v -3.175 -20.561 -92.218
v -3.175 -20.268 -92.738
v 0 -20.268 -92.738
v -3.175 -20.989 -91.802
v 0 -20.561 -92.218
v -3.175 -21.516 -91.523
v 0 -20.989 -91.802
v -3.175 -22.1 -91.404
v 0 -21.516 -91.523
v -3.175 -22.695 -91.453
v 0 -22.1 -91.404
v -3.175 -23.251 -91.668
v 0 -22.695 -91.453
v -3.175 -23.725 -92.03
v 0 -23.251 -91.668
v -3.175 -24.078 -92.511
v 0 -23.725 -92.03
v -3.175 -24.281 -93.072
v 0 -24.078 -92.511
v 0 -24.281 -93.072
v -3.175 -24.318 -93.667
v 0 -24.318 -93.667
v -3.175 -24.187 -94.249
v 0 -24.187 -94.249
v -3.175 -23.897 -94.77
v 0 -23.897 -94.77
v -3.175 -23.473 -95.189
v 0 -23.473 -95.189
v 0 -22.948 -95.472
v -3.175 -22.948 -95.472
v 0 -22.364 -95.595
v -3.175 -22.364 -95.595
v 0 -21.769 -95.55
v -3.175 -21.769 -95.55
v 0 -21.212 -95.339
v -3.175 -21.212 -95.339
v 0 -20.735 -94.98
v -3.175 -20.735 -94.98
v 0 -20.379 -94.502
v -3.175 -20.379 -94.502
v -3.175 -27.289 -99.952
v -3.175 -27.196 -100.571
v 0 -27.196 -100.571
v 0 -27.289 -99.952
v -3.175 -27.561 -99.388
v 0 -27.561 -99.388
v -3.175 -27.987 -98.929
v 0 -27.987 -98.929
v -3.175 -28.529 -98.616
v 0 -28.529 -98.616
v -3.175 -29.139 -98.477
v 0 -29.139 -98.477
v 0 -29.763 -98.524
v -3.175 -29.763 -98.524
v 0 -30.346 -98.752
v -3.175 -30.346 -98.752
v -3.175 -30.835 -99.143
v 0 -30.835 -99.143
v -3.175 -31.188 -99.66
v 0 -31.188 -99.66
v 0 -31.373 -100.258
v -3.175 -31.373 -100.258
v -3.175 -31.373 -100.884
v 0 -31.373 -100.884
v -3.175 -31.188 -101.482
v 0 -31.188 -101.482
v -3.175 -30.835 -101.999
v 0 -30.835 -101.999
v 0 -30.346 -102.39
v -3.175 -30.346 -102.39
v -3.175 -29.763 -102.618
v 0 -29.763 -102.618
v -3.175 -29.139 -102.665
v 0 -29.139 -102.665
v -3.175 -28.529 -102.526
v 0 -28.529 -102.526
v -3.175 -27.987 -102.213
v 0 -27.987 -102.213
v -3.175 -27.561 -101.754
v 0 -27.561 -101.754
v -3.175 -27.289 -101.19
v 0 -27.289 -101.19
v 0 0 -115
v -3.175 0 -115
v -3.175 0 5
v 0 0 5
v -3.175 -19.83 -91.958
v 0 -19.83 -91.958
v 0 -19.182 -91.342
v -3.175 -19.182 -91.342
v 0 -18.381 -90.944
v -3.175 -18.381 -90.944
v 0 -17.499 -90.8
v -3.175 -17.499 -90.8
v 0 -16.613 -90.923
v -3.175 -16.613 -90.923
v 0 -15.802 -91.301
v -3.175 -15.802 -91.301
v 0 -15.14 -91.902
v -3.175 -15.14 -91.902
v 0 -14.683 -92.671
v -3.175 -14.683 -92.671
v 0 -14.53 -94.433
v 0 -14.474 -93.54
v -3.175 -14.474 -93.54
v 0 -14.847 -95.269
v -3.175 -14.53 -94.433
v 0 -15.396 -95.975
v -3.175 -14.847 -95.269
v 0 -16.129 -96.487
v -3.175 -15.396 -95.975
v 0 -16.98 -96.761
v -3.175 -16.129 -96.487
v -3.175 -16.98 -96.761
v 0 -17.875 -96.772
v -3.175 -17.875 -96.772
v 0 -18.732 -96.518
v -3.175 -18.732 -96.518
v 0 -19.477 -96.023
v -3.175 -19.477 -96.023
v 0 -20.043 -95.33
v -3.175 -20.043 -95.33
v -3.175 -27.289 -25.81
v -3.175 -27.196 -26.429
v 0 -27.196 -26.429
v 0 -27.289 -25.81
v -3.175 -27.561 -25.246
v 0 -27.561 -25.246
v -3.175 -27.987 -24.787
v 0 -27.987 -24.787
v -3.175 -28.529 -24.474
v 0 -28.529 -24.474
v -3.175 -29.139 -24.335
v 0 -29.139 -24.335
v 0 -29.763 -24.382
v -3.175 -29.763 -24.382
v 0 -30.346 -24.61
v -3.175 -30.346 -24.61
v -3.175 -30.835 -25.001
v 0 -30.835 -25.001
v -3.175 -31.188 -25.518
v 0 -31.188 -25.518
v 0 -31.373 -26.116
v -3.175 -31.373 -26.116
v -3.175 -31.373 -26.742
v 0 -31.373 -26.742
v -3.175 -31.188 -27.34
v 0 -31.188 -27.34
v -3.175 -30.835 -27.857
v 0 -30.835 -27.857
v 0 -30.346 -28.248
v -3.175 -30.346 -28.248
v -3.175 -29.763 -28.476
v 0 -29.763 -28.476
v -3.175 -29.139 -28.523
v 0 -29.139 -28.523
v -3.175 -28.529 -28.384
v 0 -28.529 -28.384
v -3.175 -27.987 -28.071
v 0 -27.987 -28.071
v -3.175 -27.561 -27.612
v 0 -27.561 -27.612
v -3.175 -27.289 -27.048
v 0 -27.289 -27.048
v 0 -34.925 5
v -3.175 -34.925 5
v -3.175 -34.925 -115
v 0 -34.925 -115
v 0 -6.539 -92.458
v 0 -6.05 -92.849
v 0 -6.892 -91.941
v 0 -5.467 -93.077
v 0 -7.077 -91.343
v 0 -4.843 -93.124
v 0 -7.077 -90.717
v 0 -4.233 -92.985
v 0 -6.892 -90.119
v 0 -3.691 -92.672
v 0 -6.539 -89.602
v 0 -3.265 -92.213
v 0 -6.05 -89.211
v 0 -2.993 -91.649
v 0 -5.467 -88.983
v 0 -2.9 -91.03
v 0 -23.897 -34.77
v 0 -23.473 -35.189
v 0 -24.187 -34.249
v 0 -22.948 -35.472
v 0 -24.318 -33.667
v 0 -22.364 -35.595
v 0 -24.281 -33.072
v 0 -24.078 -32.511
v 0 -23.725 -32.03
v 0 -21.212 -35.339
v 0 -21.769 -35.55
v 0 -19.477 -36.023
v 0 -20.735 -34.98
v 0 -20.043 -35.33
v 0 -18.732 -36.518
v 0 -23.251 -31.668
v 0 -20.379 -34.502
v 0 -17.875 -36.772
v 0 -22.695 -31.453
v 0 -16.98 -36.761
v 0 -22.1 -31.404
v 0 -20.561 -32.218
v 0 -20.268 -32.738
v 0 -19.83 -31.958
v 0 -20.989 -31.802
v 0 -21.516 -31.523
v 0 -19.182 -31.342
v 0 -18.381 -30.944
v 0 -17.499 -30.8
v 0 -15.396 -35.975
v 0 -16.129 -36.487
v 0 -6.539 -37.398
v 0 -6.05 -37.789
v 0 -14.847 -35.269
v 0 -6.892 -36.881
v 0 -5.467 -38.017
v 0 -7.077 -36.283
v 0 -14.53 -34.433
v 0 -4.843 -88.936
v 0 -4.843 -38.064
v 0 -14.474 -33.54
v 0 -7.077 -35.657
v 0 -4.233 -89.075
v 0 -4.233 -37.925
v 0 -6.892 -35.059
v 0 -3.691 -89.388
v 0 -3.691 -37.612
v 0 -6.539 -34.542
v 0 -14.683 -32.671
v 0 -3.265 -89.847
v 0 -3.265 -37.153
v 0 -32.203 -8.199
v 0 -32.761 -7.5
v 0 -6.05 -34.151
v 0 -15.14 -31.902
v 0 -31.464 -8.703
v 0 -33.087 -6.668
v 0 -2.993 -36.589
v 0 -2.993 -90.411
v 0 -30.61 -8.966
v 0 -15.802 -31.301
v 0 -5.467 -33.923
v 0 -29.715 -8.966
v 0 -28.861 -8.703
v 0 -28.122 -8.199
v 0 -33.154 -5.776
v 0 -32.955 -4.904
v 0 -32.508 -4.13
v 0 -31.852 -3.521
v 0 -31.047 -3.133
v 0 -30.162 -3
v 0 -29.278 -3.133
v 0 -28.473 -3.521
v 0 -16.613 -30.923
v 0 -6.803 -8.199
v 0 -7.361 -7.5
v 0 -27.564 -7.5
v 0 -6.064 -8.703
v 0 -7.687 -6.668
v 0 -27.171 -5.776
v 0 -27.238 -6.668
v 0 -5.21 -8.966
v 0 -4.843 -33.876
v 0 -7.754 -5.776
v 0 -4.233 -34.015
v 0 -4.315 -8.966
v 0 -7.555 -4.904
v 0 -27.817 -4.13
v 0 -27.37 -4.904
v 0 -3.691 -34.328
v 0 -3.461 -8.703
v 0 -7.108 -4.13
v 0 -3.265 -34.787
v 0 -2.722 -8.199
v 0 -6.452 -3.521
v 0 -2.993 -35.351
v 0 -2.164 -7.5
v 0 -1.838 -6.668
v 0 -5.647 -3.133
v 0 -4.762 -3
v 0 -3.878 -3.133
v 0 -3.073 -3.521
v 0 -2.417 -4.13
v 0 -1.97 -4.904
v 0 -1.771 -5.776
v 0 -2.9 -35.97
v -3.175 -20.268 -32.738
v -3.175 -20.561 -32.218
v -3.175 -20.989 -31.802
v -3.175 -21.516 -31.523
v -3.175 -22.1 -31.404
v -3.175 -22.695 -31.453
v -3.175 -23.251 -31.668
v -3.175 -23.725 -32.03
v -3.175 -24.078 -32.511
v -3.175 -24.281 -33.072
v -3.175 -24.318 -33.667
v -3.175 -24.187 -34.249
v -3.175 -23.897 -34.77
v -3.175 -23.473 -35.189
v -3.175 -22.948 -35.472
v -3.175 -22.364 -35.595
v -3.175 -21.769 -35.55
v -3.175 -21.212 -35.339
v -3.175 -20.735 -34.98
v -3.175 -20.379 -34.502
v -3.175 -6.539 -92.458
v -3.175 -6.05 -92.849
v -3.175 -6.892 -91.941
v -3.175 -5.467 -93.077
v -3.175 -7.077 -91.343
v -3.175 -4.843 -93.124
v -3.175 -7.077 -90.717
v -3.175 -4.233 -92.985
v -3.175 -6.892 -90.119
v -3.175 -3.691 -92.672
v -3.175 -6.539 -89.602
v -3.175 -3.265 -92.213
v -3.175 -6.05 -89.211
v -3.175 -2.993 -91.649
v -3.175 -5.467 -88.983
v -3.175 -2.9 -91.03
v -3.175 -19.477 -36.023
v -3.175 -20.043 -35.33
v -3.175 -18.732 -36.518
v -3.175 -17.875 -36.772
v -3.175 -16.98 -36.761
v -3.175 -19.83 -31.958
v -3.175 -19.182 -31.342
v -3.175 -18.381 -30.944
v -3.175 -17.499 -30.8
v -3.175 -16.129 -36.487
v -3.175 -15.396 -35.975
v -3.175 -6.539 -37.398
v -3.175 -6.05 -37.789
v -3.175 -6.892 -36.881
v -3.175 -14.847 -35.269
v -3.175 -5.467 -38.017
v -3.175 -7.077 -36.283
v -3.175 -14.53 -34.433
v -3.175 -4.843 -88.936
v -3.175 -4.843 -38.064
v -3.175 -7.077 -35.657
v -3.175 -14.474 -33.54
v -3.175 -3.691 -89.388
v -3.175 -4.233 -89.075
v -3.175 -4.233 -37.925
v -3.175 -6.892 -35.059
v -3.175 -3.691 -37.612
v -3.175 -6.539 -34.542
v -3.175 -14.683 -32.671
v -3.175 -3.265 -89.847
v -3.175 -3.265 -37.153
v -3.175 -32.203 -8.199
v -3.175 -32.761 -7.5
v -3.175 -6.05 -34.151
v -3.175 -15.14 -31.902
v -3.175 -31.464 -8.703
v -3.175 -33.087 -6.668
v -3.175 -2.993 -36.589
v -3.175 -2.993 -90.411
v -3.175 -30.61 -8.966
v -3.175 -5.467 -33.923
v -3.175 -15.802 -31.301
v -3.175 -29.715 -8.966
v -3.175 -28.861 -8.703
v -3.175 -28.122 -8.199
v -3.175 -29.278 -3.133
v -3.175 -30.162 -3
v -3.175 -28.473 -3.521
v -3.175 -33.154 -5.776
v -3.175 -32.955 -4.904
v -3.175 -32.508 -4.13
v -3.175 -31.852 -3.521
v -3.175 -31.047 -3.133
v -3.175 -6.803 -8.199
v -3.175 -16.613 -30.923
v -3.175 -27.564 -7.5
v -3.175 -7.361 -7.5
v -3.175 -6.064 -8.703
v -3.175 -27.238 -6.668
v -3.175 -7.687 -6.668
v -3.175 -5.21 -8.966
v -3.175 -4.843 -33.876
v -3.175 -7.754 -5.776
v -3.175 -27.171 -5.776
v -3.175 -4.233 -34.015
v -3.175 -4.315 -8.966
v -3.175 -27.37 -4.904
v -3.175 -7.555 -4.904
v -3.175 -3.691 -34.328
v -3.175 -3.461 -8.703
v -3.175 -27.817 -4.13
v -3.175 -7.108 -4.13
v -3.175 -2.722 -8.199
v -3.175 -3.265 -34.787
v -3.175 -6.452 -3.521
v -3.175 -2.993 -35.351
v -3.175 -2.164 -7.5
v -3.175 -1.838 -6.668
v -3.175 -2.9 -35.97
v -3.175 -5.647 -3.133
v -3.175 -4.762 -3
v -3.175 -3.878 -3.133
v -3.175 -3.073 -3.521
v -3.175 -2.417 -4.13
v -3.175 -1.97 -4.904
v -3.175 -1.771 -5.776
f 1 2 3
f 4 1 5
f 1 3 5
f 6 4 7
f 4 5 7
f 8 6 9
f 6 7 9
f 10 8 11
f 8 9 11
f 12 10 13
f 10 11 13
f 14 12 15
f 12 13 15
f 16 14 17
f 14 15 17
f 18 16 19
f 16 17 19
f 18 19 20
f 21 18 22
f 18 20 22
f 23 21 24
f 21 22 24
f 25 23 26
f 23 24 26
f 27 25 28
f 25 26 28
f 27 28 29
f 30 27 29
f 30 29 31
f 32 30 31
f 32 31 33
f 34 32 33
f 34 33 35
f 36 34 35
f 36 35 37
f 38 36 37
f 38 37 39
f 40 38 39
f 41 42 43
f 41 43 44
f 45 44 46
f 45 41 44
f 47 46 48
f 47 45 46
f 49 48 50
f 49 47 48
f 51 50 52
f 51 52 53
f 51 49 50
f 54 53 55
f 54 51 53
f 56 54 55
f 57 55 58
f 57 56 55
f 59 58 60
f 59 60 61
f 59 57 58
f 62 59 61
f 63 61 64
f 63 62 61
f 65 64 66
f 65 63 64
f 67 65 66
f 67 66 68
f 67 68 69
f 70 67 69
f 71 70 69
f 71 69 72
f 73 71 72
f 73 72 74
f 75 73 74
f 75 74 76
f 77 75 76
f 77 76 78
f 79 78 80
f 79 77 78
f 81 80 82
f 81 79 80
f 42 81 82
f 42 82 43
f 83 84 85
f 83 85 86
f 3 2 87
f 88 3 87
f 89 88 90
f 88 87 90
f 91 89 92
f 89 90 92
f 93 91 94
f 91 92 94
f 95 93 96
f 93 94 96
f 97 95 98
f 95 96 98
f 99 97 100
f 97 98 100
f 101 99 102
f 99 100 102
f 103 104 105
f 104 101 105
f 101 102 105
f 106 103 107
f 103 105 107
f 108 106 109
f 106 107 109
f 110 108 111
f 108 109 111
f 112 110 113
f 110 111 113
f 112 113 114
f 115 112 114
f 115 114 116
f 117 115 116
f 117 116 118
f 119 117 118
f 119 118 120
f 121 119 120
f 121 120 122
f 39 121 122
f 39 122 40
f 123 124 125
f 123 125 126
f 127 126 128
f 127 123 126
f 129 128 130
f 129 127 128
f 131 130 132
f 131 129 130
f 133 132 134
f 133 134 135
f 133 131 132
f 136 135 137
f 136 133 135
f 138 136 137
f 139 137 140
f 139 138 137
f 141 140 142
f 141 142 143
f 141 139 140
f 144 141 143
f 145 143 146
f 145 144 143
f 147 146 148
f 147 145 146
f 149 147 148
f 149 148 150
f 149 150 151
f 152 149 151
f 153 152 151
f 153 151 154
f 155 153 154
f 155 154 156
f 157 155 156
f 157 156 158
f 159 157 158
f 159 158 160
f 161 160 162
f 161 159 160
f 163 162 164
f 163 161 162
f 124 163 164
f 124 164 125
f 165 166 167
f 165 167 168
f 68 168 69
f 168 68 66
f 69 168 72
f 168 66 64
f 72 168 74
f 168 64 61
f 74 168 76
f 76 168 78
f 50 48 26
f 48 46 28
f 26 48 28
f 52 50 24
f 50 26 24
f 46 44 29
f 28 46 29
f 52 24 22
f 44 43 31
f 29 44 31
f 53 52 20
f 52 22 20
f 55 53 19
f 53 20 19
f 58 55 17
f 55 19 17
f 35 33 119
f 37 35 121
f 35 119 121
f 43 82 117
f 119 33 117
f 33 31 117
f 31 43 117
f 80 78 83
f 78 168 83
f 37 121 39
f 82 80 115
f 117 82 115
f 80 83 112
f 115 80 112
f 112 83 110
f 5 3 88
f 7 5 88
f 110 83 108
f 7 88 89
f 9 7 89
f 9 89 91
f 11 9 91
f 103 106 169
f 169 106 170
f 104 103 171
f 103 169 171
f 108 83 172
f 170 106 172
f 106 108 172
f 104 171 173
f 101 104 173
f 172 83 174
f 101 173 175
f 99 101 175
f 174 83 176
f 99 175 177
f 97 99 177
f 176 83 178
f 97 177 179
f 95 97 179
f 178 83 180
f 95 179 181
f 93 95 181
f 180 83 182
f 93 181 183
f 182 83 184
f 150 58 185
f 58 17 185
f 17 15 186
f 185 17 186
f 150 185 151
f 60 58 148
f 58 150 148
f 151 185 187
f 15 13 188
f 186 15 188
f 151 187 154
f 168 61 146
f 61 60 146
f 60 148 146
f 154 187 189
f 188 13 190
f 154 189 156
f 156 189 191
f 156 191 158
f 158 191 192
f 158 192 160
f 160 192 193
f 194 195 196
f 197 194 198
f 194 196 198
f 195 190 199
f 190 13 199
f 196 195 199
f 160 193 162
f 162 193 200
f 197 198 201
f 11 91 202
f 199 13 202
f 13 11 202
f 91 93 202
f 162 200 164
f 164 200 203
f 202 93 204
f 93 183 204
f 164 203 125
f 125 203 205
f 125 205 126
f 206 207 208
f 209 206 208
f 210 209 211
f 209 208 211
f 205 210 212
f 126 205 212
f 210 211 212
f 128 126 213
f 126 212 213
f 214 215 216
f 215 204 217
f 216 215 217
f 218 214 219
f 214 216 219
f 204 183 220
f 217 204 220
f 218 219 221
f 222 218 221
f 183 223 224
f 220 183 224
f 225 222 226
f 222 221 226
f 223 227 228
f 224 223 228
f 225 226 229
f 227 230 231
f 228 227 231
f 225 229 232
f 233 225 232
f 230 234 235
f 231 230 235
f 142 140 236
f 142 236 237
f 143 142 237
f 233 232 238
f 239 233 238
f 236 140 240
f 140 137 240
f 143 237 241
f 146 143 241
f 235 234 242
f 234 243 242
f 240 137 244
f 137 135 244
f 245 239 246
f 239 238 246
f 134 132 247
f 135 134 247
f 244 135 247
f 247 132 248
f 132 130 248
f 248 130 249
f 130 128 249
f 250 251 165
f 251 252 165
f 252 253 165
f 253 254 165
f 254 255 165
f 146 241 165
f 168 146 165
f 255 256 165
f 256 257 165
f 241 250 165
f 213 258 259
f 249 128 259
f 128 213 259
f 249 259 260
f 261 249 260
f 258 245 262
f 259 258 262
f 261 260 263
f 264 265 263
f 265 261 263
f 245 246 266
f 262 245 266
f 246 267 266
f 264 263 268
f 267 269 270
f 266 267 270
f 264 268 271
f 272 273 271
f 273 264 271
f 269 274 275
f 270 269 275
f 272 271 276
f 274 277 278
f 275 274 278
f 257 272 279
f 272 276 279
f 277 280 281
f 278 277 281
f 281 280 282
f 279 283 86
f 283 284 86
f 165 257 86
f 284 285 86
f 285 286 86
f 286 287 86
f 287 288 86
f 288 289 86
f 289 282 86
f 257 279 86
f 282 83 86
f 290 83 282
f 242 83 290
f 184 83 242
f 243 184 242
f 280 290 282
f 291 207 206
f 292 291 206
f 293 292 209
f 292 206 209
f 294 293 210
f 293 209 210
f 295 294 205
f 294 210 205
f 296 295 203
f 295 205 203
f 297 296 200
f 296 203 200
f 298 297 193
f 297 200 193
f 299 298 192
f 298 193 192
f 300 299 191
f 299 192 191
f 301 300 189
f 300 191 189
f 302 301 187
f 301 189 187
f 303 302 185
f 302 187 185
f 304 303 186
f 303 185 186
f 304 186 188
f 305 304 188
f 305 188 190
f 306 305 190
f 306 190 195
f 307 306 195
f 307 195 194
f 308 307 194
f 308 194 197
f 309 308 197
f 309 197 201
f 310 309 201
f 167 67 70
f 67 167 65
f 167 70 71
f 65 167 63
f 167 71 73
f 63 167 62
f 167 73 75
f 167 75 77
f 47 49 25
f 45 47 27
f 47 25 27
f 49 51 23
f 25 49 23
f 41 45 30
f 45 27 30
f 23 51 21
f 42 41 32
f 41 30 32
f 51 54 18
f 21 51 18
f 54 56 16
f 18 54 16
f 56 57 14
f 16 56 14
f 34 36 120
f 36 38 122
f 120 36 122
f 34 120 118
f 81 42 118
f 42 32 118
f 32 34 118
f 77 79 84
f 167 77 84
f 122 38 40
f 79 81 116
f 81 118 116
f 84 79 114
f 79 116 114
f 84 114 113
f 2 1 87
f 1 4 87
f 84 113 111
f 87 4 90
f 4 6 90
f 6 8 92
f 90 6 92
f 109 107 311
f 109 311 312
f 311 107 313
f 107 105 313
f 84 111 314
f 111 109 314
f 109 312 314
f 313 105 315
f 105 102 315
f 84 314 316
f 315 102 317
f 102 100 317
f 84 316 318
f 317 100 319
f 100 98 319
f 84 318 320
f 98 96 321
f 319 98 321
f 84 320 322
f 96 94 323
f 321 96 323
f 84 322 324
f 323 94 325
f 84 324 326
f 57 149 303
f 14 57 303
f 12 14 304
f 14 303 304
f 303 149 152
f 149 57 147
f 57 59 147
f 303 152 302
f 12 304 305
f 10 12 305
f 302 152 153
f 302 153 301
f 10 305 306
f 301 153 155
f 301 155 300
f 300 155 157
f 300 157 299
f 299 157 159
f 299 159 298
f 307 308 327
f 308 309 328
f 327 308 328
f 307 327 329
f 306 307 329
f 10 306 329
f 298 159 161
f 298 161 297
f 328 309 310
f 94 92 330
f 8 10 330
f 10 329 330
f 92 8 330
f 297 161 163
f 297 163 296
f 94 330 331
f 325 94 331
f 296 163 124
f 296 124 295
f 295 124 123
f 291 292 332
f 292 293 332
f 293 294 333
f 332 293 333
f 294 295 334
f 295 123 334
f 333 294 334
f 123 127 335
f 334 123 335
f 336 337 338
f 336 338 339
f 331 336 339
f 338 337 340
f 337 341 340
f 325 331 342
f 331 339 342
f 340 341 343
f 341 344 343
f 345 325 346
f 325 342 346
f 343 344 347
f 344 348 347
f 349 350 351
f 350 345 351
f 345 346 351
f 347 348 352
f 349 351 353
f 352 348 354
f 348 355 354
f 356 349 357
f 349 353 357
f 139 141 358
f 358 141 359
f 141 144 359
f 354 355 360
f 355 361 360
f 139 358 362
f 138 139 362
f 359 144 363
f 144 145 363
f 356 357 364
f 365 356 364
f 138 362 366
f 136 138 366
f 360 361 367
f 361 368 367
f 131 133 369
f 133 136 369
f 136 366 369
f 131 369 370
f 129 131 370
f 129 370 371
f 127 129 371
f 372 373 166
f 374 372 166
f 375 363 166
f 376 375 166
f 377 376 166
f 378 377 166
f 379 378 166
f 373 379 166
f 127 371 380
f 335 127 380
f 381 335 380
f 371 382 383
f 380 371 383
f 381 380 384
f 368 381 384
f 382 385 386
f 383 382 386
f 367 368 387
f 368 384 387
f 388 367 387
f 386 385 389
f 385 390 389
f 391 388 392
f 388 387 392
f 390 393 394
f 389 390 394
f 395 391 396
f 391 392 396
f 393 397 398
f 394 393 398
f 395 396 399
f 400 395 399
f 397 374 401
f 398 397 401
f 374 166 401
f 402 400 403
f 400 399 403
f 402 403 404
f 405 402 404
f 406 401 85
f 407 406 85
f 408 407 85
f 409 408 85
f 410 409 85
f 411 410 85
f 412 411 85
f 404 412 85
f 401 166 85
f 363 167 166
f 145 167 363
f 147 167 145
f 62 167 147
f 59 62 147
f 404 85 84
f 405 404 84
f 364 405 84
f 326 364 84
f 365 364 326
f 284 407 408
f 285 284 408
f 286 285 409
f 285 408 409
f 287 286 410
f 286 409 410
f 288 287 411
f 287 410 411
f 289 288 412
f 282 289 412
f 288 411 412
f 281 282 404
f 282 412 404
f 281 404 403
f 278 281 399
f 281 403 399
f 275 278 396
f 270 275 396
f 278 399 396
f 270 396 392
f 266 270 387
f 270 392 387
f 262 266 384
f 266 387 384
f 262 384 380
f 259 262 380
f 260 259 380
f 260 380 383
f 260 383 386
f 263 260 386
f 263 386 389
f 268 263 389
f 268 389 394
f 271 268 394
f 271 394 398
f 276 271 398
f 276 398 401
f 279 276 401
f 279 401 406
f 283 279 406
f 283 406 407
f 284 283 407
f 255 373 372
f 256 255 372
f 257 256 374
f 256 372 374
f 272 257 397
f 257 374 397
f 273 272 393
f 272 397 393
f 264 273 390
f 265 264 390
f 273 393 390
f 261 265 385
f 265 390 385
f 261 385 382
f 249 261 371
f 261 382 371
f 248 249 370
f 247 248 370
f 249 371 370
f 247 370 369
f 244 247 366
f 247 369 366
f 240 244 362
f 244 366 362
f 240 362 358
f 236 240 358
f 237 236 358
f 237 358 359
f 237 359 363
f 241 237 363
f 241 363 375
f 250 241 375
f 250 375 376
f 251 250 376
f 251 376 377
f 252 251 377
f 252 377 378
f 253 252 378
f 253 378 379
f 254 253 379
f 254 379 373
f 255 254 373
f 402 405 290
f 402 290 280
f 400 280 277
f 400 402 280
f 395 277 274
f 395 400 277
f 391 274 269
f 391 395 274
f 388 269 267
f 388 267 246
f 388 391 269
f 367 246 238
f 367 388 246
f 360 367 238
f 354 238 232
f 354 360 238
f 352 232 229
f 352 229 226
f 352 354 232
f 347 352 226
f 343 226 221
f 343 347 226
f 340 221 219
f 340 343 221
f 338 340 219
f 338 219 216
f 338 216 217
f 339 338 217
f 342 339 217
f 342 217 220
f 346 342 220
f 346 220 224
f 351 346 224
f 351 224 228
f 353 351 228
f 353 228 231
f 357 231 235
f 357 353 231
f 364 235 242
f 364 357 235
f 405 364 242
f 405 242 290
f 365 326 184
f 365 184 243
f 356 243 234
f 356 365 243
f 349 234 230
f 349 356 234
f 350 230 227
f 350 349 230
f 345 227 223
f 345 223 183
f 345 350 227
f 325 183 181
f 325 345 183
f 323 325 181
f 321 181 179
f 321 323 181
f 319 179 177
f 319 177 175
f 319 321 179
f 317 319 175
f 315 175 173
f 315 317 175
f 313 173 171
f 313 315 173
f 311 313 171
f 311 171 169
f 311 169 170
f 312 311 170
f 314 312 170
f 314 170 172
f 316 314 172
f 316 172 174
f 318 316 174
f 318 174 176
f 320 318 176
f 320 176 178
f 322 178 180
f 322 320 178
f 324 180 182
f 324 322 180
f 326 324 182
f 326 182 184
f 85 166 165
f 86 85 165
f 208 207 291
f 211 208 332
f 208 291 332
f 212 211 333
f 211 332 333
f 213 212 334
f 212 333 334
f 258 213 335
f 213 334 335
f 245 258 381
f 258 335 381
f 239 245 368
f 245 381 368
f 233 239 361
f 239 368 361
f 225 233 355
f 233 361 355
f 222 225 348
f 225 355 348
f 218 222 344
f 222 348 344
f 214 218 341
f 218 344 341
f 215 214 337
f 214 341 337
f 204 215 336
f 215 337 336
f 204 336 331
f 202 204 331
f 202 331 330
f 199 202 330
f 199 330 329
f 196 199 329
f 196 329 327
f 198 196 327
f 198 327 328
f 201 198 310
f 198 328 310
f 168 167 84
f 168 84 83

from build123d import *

# Parameters (mm, degrees)
SKETCH1_W                      = 38.1
SKETCH1_H                      = 120
BOSS_EXTRUDE1_DEPTH            = 38.1
SKETCH2_W                      = 34.925
SKETCH2_H                      = 34.925
CUT_EXTRUDE1_DEPTH             = 130.767142413
F_4_2_4_2_DIAMETER_HOLE1_D     = 4.2
F_6_0_6_DIAMETER_HOLE1_D       = 6
F_4_2_4_2_DIAMETER_HOLE2_D     = 4.2
F_4_2_4_2_DIAMETER_HOLE2_DEPTH = 38.1
F_6_0_6_DIAMETER_HOLE2_D       = 6
F_6_0_6_DIAMETER_HOLE2_DEPTH   = 38.1
F_6_0_6_DIAMETER_HOLE3_D       = 6
F_6_0_6_DIAMETER_HOLE3_DEPTH   = 38.1
F_4_2_4_2_DIAMETER_HOLE3_D     = 4.2
SKETCH15_R                     = 2.1
SKETCH15_R_2                   = 3
BOSS_EXTRUDE2_DEPTH            = 3.175
BOSS_EXTRUDE3_START            = -3.175
SKETCH16_R                     = 2.1
BOSS_EXTRUDE3_DEPTH            = 3.175
SKETCH18_W                     = 3.175
SKETCH18_H                     = 3.175
CUT_EXTRUDE2_DEPTH             = 130.767142413
CUT_EXTRUDE3_START             = -3.175
CUT_EXTRUDE3_OUTLINE_R         = 2.1
CUT_EXTRUDE3_DEPTH             = 3.175
BOSS_EXTRUDE4_START            = -3.175
BOSS_EXTRUDE4_OUTLINE_R        = 3
BOSS_EXTRUDE4_DEPTH            = 3.175
SKETCH19_R                     = 3
CUT_EXTRUDE4_DEPTH             = 121.228267267


# Read off the part's stored shape, not the designer's step: Cut-Extrude3, Boss-Extrude4
with BuildPart() as part:
    # Sketch1 → Boss-Extrude1 (new body)
    with BuildSketch(Plane.XZ.offset(34.925)):
        with Locations((15.875, -55)):
            Rectangle(SKETCH1_W, SKETCH1_H)
    extrude(amount=-BOSS_EXTRUDE1_DEPTH)

    # Sketch2 → Cut-Extrude1 (cut, through all)
    with BuildSketch(Plane(origin=(0, 0, -115), x_dir=(-1, 0, 0), z_dir=(0, 0, -1))):
        with Locations((-17.4625, -17.4625)):
            Rectangle(SKETCH2_W, SKETCH2_H)
    extrude(amount=-CUT_EXTRUDE1_DEPTH, mode=Mode.SUBTRACT)

    # Ø4.2 (4.2) Diameter Hole1 (through all)
    with Locations(Plane(origin=(0, 0, 0), x_dir=(-1, 0, 0), z_dir=(0, -1, 0))):
        with Locations((-5, 35.97), (-5, 91.03)):
            Hole(F_4_2_4_2_DIAMETER_HOLE1_D / 2)

    # Ø6.0 (6) Diameter Hole1 (through all)
    with Locations(Plane(origin=(0, 0, 0), x_dir=(-1, 0, 0), z_dir=(0, -1, 0))):
        with Locations((-22.225, 106.5), (-22.225, 46.5)):
            Hole(F_6_0_6_DIAMETER_HOLE1_D / 2)

    # Ø4.2 (4.2) Diameter Hole2
    with Locations(Plane(origin=(0, 3.175, 0), x_dir=(1, 0, 0), z_dir=(0, 1, 0))):
        with Locations((22.225, 33.5), (22.225, 93.5), (29.296067812, 100.571067812), (29.296067812, 26.428932188)):
            Hole(F_4_2_4_2_DIAMETER_HOLE2_D / 2, depth=F_4_2_4_2_DIAMETER_HOLE2_DEPTH)

    # Ø6.0 (6) Diameter Hole2
    with Locations(Plane(origin=(0, 3.175, 0), x_dir=(1, 0, 0), z_dir=(0, 1, 0))):
        with Locations((24.925, 6)):
            Hole(F_6_0_6_DIAMETER_HOLE2_D / 2, depth=F_6_0_6_DIAMETER_HOLE2_DEPTH)

    # Ø6.0 (6) Diameter Hole3
    with Locations(Plane.ZY.offset(3.175)):
        with Locations((-6, -24.925), (-106.5, -22.225), (-46.5, -22.225)):
            Hole(F_6_0_6_DIAMETER_HOLE3_D / 2, depth=F_6_0_6_DIAMETER_HOLE3_DEPTH)

    # Ø4.2 (4.2) Diameter Hole3 (through all)
    with Locations(Plane.ZY.offset(3.175)):
        with Locations((-93.5, -22.225), (-33.5, -22.225), (-35.97, -5), (-91.03, -5), (-100.571067812, -29.296067812), (-26.428932188, -29.296067812)):
            Hole(F_4_2_4_2_DIAMETER_HOLE3_D / 2)

    # Sketch15 → Boss-Extrude2 (add)
    with BuildSketch(Plane(origin=(0, 3.175, 0), x_dir=(1, 0, 0), z_dir=(0, 1, 0))):
        with Locations((29.296067812, 26.428932188)):
            Circle(SKETCH15_R)
        with Locations((29.296067812, 100.571067812)):
            Circle(SKETCH15_R)
        with Locations((22.225, 106.5)):
            Circle(SKETCH15_R_2)
        with Locations((22.225, 46.5)):
            Circle(SKETCH15_R_2)
        with Locations((5, 35.97)):
            Circle(SKETCH15_R)
        with Locations((5, 91.03)):
            Circle(SKETCH15_R)
    extrude(amount=-BOSS_EXTRUDE2_DEPTH)

    # Sketch16 → Boss-Extrude3 (add)
    with BuildSketch(Plane.ZY.offset(3.175).offset(BOSS_EXTRUDE3_START)):
        with Locations((-100.571067812, -29.296067812)):
            Circle(SKETCH16_R)
        with Locations((-26.428932188, -29.296067812)):
            Circle(SKETCH16_R)
        with Locations((-35.97, -5)):
            Circle(SKETCH16_R)
        with Locations((-91.03, -5)):
            Circle(SKETCH16_R)
    extrude(amount=BOSS_EXTRUDE3_DEPTH)

    # Sketch18 → Cut-Extrude2 (cut, through all)
    with BuildSketch(Plane.XY.offset(5)):
        with Locations((-1.5875, 1.5875)):
            Rectangle(SKETCH18_W, SKETCH18_H)
    extrude(amount=-CUT_EXTRUDE2_DEPTH, mode=Mode.SUBTRACT)


with BuildPart() as body_2:
    # of the pieces the cut leaves, the one that is kept (cut_extrude2_keep)
    add(part.part.solids().sort_by_distance((-3.175, -34.925, -115))[0])

    # Cut-Extrude3 outline → Cut-Extrude3 (cut)
    with BuildSketch(Plane.YZ.offset(CUT_EXTRUDE3_START)):
        with Locations((-5, -91.03)):
            Circle(CUT_EXTRUDE3_OUTLINE_R)
        with Locations((-5, -35.97)):
            Circle(CUT_EXTRUDE3_OUTLINE_R)
        with Locations((-29.296067812, -26.428932188)):
            Circle(CUT_EXTRUDE3_OUTLINE_R)
        with Locations((-29.296067812, -100.571067812)):
            Circle(CUT_EXTRUDE3_OUTLINE_R)
    extrude(amount=CUT_EXTRUDE3_DEPTH, mode=Mode.SUBTRACT)

    # Boss-Extrude4 outline → Boss-Extrude4 (add)
    with BuildSketch(Plane.YZ.offset(BOSS_EXTRUDE4_START)):
        with Locations((-22.225, -46.5)):
            Circle(BOSS_EXTRUDE4_OUTLINE_R)
        with Locations((-22.225, -106.5)):
            Circle(BOSS_EXTRUDE4_OUTLINE_R)
        with Locations((-24.925, -6)):
            Circle(BOSS_EXTRUDE4_OUTLINE_R)
    extrude(amount=BOSS_EXTRUDE4_DEPTH)

    # Sketch19 → Cut-Extrude4 (cut, through all)
    with BuildSketch(Plane.ZY.offset(3.175)):
        with Locations((-93.8, -17.4625)):
            Circle(SKETCH19_R)
        with Locations((-33.8, -17.4625)):
            Circle(SKETCH19_R)
        with Locations((-6, -4.7625)):
            Circle(SKETCH19_R)
        with Locations((-6, -30.1625)):
            Circle(SKETCH19_R)
    extrude(amount=-CUT_EXTRUDE4_DEPTH, mode=Mode.SUBTRACT)


solid = body_2.part
